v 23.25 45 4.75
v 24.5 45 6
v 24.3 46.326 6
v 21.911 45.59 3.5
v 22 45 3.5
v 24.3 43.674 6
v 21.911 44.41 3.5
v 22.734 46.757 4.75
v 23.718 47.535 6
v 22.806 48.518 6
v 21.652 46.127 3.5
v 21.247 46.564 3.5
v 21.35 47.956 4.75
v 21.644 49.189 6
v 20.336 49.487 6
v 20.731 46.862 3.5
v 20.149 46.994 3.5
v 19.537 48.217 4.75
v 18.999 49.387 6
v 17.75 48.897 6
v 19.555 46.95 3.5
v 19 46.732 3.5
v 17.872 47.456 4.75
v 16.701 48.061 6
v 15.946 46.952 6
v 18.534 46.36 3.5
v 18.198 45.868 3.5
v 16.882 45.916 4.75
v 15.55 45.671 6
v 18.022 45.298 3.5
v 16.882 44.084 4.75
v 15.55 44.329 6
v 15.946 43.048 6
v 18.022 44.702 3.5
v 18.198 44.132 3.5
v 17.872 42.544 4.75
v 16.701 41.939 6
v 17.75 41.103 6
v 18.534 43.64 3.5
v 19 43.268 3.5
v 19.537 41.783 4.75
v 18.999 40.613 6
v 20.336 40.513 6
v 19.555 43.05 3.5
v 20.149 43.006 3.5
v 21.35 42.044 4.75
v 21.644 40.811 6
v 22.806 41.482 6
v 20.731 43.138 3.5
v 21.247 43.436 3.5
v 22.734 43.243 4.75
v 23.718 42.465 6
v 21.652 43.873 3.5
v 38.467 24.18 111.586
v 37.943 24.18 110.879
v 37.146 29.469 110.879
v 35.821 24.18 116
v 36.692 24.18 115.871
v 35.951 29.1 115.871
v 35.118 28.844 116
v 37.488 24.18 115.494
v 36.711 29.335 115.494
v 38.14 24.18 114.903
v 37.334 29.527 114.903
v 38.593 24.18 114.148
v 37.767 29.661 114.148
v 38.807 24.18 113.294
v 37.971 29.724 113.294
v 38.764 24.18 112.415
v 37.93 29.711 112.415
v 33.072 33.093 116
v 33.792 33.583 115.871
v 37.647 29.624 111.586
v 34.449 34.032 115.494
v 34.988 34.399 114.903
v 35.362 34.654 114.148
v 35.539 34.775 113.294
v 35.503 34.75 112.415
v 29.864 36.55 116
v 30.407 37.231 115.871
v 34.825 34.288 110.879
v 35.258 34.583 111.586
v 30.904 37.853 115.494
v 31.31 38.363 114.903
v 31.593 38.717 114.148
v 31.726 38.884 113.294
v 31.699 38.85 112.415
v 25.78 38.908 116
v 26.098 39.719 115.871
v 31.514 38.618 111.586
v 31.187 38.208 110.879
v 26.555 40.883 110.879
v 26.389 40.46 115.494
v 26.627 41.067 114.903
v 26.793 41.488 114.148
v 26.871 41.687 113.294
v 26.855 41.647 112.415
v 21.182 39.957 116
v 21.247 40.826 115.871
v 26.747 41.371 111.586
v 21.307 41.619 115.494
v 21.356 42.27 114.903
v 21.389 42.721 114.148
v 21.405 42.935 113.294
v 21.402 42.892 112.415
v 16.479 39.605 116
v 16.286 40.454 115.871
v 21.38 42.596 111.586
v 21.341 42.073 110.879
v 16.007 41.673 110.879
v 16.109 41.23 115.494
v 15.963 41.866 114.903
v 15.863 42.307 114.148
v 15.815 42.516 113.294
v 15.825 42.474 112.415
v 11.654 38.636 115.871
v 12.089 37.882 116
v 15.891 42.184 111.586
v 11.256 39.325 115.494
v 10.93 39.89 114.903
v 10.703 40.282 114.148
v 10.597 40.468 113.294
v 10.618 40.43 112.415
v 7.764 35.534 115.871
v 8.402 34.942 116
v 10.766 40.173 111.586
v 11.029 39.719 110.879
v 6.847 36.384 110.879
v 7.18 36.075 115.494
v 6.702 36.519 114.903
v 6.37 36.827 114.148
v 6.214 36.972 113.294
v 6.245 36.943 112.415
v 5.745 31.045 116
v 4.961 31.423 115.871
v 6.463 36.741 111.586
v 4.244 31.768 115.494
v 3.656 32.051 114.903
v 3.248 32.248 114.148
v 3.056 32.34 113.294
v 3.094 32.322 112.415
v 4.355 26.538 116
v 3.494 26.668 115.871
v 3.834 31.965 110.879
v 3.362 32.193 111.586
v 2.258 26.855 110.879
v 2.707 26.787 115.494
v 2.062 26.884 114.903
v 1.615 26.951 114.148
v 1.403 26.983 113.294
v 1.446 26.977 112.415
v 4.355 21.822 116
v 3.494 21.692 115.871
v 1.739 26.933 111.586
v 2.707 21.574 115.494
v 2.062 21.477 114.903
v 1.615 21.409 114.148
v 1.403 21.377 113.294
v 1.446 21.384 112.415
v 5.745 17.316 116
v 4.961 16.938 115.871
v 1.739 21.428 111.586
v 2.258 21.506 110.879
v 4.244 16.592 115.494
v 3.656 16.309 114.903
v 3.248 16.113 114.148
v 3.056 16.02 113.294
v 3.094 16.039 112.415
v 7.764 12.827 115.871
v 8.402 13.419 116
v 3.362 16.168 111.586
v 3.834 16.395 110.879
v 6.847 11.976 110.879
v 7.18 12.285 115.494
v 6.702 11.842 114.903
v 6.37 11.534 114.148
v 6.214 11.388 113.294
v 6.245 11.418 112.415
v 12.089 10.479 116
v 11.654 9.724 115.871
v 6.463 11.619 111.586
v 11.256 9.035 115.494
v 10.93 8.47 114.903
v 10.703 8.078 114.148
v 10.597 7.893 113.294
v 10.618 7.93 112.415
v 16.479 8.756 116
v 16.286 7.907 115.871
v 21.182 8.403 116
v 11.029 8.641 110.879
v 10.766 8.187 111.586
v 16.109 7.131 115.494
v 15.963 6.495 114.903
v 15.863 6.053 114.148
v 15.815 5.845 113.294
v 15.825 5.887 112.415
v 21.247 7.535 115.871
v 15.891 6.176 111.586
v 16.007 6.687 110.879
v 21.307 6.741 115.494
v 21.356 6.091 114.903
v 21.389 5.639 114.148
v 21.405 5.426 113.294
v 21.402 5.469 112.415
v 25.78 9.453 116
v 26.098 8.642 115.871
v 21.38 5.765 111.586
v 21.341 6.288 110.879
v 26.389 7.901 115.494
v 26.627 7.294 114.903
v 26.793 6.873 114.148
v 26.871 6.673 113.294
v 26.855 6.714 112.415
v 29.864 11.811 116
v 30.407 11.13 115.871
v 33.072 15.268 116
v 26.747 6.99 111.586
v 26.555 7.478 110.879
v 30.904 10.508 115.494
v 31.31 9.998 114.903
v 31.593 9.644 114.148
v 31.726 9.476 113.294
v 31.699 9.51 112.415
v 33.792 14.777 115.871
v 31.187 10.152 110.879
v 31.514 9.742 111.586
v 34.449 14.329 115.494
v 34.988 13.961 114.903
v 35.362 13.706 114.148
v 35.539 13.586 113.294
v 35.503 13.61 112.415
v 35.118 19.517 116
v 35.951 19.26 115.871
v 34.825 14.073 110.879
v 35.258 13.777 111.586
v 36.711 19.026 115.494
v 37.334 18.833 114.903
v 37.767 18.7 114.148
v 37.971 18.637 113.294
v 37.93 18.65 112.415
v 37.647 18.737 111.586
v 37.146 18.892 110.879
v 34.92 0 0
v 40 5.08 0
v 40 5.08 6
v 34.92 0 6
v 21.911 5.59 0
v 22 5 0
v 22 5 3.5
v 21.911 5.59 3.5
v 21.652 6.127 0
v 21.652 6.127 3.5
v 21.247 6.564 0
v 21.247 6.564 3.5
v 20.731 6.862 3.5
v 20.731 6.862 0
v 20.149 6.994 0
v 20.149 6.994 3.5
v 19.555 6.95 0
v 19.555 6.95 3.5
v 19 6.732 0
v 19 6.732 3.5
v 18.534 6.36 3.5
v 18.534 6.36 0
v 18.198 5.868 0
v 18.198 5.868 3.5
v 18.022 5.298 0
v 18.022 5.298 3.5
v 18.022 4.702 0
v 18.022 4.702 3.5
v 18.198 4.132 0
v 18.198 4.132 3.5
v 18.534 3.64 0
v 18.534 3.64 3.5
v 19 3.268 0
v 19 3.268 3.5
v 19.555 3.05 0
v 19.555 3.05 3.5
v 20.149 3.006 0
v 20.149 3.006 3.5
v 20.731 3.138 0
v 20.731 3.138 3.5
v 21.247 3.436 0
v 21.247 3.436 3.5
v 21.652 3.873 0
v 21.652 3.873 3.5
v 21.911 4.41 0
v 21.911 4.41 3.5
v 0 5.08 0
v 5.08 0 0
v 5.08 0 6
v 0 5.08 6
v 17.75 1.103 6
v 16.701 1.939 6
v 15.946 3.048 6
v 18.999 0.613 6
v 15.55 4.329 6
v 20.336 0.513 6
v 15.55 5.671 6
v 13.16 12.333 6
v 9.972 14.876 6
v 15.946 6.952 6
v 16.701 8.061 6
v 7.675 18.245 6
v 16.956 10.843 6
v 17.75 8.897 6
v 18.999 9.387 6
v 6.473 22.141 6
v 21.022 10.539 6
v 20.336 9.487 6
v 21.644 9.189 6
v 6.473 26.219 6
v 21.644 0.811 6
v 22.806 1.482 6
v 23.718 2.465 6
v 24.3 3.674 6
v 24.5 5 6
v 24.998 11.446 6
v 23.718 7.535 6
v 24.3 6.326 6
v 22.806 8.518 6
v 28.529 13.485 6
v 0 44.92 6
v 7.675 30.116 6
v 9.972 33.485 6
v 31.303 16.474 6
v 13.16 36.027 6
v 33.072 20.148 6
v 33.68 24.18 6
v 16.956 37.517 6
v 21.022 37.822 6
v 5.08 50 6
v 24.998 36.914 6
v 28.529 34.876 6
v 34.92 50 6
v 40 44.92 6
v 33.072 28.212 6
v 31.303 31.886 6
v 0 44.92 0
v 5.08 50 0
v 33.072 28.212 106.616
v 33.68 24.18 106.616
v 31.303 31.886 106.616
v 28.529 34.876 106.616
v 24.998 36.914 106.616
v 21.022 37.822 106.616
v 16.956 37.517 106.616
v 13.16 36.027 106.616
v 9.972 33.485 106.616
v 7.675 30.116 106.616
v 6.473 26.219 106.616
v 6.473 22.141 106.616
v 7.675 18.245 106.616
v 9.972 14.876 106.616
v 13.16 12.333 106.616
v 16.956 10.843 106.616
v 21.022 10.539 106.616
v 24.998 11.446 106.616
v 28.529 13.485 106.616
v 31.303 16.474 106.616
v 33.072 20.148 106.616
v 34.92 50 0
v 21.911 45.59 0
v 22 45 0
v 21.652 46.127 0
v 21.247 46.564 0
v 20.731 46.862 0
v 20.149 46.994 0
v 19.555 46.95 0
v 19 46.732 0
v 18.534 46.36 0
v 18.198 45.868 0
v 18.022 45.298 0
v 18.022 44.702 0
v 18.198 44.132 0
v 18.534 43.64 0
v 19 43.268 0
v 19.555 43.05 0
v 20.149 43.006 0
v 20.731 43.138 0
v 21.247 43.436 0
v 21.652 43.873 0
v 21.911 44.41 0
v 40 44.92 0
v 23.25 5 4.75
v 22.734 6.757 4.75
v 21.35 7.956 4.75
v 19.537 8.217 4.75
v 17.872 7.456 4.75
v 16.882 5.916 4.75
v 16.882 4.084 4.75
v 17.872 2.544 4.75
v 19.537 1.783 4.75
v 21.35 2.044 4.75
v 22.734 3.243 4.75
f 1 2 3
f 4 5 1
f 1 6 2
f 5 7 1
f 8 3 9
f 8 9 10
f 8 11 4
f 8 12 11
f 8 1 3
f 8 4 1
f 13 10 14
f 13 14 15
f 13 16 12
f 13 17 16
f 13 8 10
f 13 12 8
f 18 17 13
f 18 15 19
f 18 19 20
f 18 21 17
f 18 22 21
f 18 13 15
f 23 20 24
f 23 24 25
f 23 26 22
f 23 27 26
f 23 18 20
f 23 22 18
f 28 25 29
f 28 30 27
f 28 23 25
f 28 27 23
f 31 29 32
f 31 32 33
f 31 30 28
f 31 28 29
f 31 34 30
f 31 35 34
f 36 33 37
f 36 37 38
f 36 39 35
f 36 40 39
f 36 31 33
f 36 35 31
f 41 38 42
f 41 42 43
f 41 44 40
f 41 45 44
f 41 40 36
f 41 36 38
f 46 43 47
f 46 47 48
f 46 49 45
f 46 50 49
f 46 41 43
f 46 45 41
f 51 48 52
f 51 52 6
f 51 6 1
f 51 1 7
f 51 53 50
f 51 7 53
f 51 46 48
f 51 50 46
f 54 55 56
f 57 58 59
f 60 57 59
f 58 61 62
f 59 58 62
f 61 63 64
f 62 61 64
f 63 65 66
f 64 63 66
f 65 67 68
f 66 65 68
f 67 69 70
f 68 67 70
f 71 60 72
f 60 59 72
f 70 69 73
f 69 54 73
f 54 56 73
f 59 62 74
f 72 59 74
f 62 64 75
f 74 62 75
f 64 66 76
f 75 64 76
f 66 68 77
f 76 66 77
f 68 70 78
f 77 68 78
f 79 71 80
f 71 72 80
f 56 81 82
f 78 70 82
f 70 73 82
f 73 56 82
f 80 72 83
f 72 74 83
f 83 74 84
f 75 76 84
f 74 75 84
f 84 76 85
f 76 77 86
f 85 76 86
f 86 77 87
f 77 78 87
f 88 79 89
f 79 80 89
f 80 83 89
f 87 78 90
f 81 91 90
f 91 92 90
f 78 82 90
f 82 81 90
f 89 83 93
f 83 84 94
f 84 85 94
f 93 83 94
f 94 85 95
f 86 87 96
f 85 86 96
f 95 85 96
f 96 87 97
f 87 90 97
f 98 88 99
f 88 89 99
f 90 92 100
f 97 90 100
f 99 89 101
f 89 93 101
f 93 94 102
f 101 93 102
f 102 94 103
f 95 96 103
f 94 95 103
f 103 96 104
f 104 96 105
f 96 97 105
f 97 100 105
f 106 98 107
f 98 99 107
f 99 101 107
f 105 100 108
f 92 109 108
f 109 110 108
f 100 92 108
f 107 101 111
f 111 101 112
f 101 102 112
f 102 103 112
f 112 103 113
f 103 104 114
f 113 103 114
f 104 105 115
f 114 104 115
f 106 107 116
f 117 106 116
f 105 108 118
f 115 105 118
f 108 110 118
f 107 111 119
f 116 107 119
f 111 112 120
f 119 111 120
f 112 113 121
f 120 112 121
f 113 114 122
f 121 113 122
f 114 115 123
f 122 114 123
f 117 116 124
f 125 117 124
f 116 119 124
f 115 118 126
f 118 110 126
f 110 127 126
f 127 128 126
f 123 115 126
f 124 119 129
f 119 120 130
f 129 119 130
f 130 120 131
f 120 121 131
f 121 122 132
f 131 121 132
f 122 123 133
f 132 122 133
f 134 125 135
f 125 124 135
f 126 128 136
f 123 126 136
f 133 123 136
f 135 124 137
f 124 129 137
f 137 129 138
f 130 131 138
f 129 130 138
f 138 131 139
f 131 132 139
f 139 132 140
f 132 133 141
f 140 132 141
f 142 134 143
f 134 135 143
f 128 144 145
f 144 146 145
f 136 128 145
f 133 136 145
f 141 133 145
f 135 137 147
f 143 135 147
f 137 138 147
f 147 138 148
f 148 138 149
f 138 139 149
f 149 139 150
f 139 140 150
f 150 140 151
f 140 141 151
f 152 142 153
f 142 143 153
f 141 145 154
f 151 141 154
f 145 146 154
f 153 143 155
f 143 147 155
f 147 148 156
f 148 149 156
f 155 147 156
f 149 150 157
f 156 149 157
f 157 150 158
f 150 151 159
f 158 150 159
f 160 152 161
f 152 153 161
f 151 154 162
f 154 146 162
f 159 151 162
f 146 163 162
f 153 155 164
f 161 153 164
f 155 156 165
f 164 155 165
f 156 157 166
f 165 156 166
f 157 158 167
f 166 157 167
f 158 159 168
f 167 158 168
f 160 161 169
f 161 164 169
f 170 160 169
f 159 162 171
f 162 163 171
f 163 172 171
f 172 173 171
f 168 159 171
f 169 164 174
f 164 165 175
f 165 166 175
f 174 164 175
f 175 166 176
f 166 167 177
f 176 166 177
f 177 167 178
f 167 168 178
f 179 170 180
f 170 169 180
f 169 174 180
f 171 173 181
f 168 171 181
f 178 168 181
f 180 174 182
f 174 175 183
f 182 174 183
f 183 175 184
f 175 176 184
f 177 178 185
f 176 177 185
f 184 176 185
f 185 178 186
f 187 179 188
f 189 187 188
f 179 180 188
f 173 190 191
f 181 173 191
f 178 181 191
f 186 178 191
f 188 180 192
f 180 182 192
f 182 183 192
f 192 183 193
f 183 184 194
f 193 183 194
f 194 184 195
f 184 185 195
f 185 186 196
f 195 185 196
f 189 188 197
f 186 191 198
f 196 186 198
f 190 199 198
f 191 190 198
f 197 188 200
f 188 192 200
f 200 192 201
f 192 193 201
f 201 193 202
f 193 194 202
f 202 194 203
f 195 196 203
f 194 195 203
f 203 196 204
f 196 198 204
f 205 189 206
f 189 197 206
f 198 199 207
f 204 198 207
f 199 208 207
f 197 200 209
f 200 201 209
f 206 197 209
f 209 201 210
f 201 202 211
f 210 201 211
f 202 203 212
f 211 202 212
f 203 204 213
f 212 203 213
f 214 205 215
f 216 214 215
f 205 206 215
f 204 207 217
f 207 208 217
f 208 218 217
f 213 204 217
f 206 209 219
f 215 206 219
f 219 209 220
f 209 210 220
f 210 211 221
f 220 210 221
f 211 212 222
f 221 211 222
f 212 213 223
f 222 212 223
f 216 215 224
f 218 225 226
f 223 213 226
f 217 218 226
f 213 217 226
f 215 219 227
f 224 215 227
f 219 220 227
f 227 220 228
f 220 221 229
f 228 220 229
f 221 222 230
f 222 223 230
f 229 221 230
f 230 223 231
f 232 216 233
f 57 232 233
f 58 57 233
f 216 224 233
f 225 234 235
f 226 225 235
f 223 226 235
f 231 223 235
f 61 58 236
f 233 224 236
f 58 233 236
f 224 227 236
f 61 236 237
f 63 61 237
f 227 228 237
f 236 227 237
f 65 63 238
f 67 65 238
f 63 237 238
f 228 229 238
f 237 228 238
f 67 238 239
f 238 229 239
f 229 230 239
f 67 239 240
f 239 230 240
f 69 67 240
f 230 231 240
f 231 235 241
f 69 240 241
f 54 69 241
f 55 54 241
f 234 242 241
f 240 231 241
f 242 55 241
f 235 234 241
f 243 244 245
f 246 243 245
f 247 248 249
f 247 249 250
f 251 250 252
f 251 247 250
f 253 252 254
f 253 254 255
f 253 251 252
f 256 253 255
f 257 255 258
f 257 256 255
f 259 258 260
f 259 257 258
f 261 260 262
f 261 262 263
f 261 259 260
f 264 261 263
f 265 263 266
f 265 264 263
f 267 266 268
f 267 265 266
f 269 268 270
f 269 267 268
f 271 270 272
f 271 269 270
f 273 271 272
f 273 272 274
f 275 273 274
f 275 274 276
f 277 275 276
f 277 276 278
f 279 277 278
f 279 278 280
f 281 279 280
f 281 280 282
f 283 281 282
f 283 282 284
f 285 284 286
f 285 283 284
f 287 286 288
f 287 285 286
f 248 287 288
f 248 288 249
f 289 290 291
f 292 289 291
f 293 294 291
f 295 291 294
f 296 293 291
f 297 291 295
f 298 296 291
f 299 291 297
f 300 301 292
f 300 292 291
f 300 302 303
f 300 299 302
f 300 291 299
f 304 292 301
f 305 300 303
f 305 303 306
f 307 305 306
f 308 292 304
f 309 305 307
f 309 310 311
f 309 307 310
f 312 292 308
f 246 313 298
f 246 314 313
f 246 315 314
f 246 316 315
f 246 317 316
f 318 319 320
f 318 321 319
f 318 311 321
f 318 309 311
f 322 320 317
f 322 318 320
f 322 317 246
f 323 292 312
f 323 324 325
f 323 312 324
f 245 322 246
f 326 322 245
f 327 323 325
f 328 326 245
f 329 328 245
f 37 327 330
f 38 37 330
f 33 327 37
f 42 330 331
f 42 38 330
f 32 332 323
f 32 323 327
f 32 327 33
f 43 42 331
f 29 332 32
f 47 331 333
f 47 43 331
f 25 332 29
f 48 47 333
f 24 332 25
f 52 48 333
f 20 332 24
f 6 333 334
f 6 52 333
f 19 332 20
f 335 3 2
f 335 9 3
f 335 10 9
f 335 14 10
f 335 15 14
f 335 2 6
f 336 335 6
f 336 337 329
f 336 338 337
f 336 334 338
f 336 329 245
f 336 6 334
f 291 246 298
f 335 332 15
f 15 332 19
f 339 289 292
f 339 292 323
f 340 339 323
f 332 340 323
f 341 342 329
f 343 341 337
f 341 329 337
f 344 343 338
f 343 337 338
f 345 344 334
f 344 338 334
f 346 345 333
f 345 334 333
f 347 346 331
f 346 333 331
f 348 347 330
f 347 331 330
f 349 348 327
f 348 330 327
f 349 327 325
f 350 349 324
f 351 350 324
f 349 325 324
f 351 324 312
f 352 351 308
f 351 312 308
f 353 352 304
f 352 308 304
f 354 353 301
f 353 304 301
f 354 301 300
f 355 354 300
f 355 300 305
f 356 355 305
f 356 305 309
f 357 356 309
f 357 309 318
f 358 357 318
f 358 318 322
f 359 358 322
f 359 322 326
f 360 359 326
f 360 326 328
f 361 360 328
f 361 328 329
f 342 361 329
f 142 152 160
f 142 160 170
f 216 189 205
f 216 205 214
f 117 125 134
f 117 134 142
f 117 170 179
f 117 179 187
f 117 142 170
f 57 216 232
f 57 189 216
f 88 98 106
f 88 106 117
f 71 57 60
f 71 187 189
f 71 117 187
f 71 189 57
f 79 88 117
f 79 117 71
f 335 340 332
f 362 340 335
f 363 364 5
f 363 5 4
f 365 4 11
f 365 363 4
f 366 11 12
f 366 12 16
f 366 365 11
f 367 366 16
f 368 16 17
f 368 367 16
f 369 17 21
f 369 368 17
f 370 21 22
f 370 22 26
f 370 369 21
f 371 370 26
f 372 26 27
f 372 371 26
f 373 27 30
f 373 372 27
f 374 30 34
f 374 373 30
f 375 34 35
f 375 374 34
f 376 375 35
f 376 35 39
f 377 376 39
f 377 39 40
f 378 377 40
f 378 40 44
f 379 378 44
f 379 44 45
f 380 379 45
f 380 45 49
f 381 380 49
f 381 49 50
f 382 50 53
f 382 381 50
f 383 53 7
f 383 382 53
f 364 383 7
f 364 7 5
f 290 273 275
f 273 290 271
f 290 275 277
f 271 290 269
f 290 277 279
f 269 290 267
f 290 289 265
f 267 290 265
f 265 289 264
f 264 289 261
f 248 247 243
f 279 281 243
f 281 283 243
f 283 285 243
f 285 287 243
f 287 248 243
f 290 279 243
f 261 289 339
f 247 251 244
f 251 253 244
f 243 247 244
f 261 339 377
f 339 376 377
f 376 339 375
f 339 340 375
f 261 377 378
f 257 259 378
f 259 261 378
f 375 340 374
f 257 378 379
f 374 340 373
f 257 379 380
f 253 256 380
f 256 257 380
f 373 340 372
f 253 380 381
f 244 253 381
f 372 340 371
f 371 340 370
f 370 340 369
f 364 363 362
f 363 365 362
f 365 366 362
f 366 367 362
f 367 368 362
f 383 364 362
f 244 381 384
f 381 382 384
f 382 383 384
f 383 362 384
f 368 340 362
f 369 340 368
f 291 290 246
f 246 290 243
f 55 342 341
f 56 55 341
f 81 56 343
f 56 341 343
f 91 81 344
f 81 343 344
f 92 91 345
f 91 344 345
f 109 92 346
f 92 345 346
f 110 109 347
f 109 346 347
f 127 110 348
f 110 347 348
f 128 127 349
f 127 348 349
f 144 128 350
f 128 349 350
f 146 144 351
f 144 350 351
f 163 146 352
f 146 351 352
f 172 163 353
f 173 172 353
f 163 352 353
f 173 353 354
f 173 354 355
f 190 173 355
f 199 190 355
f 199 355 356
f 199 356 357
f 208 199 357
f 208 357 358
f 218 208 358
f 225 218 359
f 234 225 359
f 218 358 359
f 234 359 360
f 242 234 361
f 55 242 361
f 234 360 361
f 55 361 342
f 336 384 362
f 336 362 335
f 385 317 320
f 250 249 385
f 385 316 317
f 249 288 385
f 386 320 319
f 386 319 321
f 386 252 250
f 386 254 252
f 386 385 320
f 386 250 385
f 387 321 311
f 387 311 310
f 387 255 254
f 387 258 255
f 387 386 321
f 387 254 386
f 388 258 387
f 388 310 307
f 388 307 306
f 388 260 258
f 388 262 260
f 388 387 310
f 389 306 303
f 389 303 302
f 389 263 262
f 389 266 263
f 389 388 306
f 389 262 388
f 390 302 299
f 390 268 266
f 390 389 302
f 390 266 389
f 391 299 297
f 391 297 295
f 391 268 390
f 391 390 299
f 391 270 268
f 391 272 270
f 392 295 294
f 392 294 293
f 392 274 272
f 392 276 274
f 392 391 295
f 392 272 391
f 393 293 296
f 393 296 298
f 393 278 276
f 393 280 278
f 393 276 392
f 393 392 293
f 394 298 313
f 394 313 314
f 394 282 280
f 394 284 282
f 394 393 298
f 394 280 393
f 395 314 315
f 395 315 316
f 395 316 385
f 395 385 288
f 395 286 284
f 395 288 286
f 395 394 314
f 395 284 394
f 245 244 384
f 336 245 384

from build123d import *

# Parameters (mm, degrees)
F0_W        = 40
F0_H        = 50
F0_R        = 2
F1_DEPTH    = 6
F2_R        = 13.6797776514
F3_DEPTH    = 100
F4_R        = 23.0640267833
F5_DEPTH    = 10
F6_S5_R     = 13.6797776514
F6_T6_DEPTH = 34
F7_R        = 3
F8_SIZE     = 5.08
F9_SIZE     = 2.5


# Not quite as in the source:
# - a fillet or chamfer that OpenCascade refuses, or shapes differently, is made with other operations: its cross-section is extruded or revolved along the edge and cut away or added


with BuildPart() as f1:
    # F0 (on Top) → F1 (new body)
    with BuildSketch(Plane.XY):
        with Locations((20, 25)):
            Rectangle(F0_W, F0_H)
        with Locations((20, 5)):
            Circle(F0_R, mode=Mode.SUBTRACT)
        with Locations((20, 45)):
            Circle(F0_R, mode=Mode.SUBTRACT)
    extrude(amount=F1_DEPTH)

    # F2 (on face) → F3 (join)
    with BuildSketch(Plane.XY.offset(6)):
        with Locations((20, 24.1802949458)):
            Circle(F2_R)
    extrude(amount=F3_DEPTH)

    # F4 (on face) → F5 (join)
    with BuildSketch(Plane.XY.offset(106)):
        with Locations((20, 24.1802949458)):
            Circle(F4_R)
    extrude(amount=F5_DEPTH)

    # F6: chamfer of 10 on 1 edges, made by hand


with BuildPart() as f6_tool2:
    # F6_s3 → F6_t4 (revolve)
    with BuildSketch(Plane.XZ.offset(-24.1802949458)):
        Polygon((43.0640267833, 116), (33.0640267833, 106), (43.0640267833, 106), align=None)
    revolve(axis=Axis((20, 24.1802949458, 106), (0, 0, 1)))

    # F6_s5 → F6_t6 (cut, symmetric)
    with BuildSketch(Plane.XY.offset(111)):
        with Locations((20, 24.1802949458)):
            Circle(F6_S5_R)
    extrude(amount=F6_T6_DEPTH, both=True, mode=Mode.SUBTRACT)


with BuildPart() as f1_1:
    add(f1.part)

    # F6_t1: cut F6_tool2
    add(f6_tool2.part, mode=Mode.SUBTRACT)

    # F7
    f7_edges = [f1_1.edges().sort_by_distance(p)[0] for p in [
        (-3.064027, 24.180295, 116),
    ]]
    fillet(f7_edges, radius=F7_R)

    # F8
    f8_edges = [f1_1.edges().sort_by_distance(p)[0] for p in [
        (40, 0, 3),
        (40, 50, 3),
        (0, 50, 3),
        (0, 0, 3),
    ]]
    chamfer(f8_edges, length=F8_SIZE)

    # F9
    f9_edges = [f1_1.edges().sort_by_distance(p)[0] for p in [
        (18, 5, 6),
        (18, 45, 6),
    ]]
    chamfer(f9_edges, length=F9_SIZE)


solid = f1_1.part
